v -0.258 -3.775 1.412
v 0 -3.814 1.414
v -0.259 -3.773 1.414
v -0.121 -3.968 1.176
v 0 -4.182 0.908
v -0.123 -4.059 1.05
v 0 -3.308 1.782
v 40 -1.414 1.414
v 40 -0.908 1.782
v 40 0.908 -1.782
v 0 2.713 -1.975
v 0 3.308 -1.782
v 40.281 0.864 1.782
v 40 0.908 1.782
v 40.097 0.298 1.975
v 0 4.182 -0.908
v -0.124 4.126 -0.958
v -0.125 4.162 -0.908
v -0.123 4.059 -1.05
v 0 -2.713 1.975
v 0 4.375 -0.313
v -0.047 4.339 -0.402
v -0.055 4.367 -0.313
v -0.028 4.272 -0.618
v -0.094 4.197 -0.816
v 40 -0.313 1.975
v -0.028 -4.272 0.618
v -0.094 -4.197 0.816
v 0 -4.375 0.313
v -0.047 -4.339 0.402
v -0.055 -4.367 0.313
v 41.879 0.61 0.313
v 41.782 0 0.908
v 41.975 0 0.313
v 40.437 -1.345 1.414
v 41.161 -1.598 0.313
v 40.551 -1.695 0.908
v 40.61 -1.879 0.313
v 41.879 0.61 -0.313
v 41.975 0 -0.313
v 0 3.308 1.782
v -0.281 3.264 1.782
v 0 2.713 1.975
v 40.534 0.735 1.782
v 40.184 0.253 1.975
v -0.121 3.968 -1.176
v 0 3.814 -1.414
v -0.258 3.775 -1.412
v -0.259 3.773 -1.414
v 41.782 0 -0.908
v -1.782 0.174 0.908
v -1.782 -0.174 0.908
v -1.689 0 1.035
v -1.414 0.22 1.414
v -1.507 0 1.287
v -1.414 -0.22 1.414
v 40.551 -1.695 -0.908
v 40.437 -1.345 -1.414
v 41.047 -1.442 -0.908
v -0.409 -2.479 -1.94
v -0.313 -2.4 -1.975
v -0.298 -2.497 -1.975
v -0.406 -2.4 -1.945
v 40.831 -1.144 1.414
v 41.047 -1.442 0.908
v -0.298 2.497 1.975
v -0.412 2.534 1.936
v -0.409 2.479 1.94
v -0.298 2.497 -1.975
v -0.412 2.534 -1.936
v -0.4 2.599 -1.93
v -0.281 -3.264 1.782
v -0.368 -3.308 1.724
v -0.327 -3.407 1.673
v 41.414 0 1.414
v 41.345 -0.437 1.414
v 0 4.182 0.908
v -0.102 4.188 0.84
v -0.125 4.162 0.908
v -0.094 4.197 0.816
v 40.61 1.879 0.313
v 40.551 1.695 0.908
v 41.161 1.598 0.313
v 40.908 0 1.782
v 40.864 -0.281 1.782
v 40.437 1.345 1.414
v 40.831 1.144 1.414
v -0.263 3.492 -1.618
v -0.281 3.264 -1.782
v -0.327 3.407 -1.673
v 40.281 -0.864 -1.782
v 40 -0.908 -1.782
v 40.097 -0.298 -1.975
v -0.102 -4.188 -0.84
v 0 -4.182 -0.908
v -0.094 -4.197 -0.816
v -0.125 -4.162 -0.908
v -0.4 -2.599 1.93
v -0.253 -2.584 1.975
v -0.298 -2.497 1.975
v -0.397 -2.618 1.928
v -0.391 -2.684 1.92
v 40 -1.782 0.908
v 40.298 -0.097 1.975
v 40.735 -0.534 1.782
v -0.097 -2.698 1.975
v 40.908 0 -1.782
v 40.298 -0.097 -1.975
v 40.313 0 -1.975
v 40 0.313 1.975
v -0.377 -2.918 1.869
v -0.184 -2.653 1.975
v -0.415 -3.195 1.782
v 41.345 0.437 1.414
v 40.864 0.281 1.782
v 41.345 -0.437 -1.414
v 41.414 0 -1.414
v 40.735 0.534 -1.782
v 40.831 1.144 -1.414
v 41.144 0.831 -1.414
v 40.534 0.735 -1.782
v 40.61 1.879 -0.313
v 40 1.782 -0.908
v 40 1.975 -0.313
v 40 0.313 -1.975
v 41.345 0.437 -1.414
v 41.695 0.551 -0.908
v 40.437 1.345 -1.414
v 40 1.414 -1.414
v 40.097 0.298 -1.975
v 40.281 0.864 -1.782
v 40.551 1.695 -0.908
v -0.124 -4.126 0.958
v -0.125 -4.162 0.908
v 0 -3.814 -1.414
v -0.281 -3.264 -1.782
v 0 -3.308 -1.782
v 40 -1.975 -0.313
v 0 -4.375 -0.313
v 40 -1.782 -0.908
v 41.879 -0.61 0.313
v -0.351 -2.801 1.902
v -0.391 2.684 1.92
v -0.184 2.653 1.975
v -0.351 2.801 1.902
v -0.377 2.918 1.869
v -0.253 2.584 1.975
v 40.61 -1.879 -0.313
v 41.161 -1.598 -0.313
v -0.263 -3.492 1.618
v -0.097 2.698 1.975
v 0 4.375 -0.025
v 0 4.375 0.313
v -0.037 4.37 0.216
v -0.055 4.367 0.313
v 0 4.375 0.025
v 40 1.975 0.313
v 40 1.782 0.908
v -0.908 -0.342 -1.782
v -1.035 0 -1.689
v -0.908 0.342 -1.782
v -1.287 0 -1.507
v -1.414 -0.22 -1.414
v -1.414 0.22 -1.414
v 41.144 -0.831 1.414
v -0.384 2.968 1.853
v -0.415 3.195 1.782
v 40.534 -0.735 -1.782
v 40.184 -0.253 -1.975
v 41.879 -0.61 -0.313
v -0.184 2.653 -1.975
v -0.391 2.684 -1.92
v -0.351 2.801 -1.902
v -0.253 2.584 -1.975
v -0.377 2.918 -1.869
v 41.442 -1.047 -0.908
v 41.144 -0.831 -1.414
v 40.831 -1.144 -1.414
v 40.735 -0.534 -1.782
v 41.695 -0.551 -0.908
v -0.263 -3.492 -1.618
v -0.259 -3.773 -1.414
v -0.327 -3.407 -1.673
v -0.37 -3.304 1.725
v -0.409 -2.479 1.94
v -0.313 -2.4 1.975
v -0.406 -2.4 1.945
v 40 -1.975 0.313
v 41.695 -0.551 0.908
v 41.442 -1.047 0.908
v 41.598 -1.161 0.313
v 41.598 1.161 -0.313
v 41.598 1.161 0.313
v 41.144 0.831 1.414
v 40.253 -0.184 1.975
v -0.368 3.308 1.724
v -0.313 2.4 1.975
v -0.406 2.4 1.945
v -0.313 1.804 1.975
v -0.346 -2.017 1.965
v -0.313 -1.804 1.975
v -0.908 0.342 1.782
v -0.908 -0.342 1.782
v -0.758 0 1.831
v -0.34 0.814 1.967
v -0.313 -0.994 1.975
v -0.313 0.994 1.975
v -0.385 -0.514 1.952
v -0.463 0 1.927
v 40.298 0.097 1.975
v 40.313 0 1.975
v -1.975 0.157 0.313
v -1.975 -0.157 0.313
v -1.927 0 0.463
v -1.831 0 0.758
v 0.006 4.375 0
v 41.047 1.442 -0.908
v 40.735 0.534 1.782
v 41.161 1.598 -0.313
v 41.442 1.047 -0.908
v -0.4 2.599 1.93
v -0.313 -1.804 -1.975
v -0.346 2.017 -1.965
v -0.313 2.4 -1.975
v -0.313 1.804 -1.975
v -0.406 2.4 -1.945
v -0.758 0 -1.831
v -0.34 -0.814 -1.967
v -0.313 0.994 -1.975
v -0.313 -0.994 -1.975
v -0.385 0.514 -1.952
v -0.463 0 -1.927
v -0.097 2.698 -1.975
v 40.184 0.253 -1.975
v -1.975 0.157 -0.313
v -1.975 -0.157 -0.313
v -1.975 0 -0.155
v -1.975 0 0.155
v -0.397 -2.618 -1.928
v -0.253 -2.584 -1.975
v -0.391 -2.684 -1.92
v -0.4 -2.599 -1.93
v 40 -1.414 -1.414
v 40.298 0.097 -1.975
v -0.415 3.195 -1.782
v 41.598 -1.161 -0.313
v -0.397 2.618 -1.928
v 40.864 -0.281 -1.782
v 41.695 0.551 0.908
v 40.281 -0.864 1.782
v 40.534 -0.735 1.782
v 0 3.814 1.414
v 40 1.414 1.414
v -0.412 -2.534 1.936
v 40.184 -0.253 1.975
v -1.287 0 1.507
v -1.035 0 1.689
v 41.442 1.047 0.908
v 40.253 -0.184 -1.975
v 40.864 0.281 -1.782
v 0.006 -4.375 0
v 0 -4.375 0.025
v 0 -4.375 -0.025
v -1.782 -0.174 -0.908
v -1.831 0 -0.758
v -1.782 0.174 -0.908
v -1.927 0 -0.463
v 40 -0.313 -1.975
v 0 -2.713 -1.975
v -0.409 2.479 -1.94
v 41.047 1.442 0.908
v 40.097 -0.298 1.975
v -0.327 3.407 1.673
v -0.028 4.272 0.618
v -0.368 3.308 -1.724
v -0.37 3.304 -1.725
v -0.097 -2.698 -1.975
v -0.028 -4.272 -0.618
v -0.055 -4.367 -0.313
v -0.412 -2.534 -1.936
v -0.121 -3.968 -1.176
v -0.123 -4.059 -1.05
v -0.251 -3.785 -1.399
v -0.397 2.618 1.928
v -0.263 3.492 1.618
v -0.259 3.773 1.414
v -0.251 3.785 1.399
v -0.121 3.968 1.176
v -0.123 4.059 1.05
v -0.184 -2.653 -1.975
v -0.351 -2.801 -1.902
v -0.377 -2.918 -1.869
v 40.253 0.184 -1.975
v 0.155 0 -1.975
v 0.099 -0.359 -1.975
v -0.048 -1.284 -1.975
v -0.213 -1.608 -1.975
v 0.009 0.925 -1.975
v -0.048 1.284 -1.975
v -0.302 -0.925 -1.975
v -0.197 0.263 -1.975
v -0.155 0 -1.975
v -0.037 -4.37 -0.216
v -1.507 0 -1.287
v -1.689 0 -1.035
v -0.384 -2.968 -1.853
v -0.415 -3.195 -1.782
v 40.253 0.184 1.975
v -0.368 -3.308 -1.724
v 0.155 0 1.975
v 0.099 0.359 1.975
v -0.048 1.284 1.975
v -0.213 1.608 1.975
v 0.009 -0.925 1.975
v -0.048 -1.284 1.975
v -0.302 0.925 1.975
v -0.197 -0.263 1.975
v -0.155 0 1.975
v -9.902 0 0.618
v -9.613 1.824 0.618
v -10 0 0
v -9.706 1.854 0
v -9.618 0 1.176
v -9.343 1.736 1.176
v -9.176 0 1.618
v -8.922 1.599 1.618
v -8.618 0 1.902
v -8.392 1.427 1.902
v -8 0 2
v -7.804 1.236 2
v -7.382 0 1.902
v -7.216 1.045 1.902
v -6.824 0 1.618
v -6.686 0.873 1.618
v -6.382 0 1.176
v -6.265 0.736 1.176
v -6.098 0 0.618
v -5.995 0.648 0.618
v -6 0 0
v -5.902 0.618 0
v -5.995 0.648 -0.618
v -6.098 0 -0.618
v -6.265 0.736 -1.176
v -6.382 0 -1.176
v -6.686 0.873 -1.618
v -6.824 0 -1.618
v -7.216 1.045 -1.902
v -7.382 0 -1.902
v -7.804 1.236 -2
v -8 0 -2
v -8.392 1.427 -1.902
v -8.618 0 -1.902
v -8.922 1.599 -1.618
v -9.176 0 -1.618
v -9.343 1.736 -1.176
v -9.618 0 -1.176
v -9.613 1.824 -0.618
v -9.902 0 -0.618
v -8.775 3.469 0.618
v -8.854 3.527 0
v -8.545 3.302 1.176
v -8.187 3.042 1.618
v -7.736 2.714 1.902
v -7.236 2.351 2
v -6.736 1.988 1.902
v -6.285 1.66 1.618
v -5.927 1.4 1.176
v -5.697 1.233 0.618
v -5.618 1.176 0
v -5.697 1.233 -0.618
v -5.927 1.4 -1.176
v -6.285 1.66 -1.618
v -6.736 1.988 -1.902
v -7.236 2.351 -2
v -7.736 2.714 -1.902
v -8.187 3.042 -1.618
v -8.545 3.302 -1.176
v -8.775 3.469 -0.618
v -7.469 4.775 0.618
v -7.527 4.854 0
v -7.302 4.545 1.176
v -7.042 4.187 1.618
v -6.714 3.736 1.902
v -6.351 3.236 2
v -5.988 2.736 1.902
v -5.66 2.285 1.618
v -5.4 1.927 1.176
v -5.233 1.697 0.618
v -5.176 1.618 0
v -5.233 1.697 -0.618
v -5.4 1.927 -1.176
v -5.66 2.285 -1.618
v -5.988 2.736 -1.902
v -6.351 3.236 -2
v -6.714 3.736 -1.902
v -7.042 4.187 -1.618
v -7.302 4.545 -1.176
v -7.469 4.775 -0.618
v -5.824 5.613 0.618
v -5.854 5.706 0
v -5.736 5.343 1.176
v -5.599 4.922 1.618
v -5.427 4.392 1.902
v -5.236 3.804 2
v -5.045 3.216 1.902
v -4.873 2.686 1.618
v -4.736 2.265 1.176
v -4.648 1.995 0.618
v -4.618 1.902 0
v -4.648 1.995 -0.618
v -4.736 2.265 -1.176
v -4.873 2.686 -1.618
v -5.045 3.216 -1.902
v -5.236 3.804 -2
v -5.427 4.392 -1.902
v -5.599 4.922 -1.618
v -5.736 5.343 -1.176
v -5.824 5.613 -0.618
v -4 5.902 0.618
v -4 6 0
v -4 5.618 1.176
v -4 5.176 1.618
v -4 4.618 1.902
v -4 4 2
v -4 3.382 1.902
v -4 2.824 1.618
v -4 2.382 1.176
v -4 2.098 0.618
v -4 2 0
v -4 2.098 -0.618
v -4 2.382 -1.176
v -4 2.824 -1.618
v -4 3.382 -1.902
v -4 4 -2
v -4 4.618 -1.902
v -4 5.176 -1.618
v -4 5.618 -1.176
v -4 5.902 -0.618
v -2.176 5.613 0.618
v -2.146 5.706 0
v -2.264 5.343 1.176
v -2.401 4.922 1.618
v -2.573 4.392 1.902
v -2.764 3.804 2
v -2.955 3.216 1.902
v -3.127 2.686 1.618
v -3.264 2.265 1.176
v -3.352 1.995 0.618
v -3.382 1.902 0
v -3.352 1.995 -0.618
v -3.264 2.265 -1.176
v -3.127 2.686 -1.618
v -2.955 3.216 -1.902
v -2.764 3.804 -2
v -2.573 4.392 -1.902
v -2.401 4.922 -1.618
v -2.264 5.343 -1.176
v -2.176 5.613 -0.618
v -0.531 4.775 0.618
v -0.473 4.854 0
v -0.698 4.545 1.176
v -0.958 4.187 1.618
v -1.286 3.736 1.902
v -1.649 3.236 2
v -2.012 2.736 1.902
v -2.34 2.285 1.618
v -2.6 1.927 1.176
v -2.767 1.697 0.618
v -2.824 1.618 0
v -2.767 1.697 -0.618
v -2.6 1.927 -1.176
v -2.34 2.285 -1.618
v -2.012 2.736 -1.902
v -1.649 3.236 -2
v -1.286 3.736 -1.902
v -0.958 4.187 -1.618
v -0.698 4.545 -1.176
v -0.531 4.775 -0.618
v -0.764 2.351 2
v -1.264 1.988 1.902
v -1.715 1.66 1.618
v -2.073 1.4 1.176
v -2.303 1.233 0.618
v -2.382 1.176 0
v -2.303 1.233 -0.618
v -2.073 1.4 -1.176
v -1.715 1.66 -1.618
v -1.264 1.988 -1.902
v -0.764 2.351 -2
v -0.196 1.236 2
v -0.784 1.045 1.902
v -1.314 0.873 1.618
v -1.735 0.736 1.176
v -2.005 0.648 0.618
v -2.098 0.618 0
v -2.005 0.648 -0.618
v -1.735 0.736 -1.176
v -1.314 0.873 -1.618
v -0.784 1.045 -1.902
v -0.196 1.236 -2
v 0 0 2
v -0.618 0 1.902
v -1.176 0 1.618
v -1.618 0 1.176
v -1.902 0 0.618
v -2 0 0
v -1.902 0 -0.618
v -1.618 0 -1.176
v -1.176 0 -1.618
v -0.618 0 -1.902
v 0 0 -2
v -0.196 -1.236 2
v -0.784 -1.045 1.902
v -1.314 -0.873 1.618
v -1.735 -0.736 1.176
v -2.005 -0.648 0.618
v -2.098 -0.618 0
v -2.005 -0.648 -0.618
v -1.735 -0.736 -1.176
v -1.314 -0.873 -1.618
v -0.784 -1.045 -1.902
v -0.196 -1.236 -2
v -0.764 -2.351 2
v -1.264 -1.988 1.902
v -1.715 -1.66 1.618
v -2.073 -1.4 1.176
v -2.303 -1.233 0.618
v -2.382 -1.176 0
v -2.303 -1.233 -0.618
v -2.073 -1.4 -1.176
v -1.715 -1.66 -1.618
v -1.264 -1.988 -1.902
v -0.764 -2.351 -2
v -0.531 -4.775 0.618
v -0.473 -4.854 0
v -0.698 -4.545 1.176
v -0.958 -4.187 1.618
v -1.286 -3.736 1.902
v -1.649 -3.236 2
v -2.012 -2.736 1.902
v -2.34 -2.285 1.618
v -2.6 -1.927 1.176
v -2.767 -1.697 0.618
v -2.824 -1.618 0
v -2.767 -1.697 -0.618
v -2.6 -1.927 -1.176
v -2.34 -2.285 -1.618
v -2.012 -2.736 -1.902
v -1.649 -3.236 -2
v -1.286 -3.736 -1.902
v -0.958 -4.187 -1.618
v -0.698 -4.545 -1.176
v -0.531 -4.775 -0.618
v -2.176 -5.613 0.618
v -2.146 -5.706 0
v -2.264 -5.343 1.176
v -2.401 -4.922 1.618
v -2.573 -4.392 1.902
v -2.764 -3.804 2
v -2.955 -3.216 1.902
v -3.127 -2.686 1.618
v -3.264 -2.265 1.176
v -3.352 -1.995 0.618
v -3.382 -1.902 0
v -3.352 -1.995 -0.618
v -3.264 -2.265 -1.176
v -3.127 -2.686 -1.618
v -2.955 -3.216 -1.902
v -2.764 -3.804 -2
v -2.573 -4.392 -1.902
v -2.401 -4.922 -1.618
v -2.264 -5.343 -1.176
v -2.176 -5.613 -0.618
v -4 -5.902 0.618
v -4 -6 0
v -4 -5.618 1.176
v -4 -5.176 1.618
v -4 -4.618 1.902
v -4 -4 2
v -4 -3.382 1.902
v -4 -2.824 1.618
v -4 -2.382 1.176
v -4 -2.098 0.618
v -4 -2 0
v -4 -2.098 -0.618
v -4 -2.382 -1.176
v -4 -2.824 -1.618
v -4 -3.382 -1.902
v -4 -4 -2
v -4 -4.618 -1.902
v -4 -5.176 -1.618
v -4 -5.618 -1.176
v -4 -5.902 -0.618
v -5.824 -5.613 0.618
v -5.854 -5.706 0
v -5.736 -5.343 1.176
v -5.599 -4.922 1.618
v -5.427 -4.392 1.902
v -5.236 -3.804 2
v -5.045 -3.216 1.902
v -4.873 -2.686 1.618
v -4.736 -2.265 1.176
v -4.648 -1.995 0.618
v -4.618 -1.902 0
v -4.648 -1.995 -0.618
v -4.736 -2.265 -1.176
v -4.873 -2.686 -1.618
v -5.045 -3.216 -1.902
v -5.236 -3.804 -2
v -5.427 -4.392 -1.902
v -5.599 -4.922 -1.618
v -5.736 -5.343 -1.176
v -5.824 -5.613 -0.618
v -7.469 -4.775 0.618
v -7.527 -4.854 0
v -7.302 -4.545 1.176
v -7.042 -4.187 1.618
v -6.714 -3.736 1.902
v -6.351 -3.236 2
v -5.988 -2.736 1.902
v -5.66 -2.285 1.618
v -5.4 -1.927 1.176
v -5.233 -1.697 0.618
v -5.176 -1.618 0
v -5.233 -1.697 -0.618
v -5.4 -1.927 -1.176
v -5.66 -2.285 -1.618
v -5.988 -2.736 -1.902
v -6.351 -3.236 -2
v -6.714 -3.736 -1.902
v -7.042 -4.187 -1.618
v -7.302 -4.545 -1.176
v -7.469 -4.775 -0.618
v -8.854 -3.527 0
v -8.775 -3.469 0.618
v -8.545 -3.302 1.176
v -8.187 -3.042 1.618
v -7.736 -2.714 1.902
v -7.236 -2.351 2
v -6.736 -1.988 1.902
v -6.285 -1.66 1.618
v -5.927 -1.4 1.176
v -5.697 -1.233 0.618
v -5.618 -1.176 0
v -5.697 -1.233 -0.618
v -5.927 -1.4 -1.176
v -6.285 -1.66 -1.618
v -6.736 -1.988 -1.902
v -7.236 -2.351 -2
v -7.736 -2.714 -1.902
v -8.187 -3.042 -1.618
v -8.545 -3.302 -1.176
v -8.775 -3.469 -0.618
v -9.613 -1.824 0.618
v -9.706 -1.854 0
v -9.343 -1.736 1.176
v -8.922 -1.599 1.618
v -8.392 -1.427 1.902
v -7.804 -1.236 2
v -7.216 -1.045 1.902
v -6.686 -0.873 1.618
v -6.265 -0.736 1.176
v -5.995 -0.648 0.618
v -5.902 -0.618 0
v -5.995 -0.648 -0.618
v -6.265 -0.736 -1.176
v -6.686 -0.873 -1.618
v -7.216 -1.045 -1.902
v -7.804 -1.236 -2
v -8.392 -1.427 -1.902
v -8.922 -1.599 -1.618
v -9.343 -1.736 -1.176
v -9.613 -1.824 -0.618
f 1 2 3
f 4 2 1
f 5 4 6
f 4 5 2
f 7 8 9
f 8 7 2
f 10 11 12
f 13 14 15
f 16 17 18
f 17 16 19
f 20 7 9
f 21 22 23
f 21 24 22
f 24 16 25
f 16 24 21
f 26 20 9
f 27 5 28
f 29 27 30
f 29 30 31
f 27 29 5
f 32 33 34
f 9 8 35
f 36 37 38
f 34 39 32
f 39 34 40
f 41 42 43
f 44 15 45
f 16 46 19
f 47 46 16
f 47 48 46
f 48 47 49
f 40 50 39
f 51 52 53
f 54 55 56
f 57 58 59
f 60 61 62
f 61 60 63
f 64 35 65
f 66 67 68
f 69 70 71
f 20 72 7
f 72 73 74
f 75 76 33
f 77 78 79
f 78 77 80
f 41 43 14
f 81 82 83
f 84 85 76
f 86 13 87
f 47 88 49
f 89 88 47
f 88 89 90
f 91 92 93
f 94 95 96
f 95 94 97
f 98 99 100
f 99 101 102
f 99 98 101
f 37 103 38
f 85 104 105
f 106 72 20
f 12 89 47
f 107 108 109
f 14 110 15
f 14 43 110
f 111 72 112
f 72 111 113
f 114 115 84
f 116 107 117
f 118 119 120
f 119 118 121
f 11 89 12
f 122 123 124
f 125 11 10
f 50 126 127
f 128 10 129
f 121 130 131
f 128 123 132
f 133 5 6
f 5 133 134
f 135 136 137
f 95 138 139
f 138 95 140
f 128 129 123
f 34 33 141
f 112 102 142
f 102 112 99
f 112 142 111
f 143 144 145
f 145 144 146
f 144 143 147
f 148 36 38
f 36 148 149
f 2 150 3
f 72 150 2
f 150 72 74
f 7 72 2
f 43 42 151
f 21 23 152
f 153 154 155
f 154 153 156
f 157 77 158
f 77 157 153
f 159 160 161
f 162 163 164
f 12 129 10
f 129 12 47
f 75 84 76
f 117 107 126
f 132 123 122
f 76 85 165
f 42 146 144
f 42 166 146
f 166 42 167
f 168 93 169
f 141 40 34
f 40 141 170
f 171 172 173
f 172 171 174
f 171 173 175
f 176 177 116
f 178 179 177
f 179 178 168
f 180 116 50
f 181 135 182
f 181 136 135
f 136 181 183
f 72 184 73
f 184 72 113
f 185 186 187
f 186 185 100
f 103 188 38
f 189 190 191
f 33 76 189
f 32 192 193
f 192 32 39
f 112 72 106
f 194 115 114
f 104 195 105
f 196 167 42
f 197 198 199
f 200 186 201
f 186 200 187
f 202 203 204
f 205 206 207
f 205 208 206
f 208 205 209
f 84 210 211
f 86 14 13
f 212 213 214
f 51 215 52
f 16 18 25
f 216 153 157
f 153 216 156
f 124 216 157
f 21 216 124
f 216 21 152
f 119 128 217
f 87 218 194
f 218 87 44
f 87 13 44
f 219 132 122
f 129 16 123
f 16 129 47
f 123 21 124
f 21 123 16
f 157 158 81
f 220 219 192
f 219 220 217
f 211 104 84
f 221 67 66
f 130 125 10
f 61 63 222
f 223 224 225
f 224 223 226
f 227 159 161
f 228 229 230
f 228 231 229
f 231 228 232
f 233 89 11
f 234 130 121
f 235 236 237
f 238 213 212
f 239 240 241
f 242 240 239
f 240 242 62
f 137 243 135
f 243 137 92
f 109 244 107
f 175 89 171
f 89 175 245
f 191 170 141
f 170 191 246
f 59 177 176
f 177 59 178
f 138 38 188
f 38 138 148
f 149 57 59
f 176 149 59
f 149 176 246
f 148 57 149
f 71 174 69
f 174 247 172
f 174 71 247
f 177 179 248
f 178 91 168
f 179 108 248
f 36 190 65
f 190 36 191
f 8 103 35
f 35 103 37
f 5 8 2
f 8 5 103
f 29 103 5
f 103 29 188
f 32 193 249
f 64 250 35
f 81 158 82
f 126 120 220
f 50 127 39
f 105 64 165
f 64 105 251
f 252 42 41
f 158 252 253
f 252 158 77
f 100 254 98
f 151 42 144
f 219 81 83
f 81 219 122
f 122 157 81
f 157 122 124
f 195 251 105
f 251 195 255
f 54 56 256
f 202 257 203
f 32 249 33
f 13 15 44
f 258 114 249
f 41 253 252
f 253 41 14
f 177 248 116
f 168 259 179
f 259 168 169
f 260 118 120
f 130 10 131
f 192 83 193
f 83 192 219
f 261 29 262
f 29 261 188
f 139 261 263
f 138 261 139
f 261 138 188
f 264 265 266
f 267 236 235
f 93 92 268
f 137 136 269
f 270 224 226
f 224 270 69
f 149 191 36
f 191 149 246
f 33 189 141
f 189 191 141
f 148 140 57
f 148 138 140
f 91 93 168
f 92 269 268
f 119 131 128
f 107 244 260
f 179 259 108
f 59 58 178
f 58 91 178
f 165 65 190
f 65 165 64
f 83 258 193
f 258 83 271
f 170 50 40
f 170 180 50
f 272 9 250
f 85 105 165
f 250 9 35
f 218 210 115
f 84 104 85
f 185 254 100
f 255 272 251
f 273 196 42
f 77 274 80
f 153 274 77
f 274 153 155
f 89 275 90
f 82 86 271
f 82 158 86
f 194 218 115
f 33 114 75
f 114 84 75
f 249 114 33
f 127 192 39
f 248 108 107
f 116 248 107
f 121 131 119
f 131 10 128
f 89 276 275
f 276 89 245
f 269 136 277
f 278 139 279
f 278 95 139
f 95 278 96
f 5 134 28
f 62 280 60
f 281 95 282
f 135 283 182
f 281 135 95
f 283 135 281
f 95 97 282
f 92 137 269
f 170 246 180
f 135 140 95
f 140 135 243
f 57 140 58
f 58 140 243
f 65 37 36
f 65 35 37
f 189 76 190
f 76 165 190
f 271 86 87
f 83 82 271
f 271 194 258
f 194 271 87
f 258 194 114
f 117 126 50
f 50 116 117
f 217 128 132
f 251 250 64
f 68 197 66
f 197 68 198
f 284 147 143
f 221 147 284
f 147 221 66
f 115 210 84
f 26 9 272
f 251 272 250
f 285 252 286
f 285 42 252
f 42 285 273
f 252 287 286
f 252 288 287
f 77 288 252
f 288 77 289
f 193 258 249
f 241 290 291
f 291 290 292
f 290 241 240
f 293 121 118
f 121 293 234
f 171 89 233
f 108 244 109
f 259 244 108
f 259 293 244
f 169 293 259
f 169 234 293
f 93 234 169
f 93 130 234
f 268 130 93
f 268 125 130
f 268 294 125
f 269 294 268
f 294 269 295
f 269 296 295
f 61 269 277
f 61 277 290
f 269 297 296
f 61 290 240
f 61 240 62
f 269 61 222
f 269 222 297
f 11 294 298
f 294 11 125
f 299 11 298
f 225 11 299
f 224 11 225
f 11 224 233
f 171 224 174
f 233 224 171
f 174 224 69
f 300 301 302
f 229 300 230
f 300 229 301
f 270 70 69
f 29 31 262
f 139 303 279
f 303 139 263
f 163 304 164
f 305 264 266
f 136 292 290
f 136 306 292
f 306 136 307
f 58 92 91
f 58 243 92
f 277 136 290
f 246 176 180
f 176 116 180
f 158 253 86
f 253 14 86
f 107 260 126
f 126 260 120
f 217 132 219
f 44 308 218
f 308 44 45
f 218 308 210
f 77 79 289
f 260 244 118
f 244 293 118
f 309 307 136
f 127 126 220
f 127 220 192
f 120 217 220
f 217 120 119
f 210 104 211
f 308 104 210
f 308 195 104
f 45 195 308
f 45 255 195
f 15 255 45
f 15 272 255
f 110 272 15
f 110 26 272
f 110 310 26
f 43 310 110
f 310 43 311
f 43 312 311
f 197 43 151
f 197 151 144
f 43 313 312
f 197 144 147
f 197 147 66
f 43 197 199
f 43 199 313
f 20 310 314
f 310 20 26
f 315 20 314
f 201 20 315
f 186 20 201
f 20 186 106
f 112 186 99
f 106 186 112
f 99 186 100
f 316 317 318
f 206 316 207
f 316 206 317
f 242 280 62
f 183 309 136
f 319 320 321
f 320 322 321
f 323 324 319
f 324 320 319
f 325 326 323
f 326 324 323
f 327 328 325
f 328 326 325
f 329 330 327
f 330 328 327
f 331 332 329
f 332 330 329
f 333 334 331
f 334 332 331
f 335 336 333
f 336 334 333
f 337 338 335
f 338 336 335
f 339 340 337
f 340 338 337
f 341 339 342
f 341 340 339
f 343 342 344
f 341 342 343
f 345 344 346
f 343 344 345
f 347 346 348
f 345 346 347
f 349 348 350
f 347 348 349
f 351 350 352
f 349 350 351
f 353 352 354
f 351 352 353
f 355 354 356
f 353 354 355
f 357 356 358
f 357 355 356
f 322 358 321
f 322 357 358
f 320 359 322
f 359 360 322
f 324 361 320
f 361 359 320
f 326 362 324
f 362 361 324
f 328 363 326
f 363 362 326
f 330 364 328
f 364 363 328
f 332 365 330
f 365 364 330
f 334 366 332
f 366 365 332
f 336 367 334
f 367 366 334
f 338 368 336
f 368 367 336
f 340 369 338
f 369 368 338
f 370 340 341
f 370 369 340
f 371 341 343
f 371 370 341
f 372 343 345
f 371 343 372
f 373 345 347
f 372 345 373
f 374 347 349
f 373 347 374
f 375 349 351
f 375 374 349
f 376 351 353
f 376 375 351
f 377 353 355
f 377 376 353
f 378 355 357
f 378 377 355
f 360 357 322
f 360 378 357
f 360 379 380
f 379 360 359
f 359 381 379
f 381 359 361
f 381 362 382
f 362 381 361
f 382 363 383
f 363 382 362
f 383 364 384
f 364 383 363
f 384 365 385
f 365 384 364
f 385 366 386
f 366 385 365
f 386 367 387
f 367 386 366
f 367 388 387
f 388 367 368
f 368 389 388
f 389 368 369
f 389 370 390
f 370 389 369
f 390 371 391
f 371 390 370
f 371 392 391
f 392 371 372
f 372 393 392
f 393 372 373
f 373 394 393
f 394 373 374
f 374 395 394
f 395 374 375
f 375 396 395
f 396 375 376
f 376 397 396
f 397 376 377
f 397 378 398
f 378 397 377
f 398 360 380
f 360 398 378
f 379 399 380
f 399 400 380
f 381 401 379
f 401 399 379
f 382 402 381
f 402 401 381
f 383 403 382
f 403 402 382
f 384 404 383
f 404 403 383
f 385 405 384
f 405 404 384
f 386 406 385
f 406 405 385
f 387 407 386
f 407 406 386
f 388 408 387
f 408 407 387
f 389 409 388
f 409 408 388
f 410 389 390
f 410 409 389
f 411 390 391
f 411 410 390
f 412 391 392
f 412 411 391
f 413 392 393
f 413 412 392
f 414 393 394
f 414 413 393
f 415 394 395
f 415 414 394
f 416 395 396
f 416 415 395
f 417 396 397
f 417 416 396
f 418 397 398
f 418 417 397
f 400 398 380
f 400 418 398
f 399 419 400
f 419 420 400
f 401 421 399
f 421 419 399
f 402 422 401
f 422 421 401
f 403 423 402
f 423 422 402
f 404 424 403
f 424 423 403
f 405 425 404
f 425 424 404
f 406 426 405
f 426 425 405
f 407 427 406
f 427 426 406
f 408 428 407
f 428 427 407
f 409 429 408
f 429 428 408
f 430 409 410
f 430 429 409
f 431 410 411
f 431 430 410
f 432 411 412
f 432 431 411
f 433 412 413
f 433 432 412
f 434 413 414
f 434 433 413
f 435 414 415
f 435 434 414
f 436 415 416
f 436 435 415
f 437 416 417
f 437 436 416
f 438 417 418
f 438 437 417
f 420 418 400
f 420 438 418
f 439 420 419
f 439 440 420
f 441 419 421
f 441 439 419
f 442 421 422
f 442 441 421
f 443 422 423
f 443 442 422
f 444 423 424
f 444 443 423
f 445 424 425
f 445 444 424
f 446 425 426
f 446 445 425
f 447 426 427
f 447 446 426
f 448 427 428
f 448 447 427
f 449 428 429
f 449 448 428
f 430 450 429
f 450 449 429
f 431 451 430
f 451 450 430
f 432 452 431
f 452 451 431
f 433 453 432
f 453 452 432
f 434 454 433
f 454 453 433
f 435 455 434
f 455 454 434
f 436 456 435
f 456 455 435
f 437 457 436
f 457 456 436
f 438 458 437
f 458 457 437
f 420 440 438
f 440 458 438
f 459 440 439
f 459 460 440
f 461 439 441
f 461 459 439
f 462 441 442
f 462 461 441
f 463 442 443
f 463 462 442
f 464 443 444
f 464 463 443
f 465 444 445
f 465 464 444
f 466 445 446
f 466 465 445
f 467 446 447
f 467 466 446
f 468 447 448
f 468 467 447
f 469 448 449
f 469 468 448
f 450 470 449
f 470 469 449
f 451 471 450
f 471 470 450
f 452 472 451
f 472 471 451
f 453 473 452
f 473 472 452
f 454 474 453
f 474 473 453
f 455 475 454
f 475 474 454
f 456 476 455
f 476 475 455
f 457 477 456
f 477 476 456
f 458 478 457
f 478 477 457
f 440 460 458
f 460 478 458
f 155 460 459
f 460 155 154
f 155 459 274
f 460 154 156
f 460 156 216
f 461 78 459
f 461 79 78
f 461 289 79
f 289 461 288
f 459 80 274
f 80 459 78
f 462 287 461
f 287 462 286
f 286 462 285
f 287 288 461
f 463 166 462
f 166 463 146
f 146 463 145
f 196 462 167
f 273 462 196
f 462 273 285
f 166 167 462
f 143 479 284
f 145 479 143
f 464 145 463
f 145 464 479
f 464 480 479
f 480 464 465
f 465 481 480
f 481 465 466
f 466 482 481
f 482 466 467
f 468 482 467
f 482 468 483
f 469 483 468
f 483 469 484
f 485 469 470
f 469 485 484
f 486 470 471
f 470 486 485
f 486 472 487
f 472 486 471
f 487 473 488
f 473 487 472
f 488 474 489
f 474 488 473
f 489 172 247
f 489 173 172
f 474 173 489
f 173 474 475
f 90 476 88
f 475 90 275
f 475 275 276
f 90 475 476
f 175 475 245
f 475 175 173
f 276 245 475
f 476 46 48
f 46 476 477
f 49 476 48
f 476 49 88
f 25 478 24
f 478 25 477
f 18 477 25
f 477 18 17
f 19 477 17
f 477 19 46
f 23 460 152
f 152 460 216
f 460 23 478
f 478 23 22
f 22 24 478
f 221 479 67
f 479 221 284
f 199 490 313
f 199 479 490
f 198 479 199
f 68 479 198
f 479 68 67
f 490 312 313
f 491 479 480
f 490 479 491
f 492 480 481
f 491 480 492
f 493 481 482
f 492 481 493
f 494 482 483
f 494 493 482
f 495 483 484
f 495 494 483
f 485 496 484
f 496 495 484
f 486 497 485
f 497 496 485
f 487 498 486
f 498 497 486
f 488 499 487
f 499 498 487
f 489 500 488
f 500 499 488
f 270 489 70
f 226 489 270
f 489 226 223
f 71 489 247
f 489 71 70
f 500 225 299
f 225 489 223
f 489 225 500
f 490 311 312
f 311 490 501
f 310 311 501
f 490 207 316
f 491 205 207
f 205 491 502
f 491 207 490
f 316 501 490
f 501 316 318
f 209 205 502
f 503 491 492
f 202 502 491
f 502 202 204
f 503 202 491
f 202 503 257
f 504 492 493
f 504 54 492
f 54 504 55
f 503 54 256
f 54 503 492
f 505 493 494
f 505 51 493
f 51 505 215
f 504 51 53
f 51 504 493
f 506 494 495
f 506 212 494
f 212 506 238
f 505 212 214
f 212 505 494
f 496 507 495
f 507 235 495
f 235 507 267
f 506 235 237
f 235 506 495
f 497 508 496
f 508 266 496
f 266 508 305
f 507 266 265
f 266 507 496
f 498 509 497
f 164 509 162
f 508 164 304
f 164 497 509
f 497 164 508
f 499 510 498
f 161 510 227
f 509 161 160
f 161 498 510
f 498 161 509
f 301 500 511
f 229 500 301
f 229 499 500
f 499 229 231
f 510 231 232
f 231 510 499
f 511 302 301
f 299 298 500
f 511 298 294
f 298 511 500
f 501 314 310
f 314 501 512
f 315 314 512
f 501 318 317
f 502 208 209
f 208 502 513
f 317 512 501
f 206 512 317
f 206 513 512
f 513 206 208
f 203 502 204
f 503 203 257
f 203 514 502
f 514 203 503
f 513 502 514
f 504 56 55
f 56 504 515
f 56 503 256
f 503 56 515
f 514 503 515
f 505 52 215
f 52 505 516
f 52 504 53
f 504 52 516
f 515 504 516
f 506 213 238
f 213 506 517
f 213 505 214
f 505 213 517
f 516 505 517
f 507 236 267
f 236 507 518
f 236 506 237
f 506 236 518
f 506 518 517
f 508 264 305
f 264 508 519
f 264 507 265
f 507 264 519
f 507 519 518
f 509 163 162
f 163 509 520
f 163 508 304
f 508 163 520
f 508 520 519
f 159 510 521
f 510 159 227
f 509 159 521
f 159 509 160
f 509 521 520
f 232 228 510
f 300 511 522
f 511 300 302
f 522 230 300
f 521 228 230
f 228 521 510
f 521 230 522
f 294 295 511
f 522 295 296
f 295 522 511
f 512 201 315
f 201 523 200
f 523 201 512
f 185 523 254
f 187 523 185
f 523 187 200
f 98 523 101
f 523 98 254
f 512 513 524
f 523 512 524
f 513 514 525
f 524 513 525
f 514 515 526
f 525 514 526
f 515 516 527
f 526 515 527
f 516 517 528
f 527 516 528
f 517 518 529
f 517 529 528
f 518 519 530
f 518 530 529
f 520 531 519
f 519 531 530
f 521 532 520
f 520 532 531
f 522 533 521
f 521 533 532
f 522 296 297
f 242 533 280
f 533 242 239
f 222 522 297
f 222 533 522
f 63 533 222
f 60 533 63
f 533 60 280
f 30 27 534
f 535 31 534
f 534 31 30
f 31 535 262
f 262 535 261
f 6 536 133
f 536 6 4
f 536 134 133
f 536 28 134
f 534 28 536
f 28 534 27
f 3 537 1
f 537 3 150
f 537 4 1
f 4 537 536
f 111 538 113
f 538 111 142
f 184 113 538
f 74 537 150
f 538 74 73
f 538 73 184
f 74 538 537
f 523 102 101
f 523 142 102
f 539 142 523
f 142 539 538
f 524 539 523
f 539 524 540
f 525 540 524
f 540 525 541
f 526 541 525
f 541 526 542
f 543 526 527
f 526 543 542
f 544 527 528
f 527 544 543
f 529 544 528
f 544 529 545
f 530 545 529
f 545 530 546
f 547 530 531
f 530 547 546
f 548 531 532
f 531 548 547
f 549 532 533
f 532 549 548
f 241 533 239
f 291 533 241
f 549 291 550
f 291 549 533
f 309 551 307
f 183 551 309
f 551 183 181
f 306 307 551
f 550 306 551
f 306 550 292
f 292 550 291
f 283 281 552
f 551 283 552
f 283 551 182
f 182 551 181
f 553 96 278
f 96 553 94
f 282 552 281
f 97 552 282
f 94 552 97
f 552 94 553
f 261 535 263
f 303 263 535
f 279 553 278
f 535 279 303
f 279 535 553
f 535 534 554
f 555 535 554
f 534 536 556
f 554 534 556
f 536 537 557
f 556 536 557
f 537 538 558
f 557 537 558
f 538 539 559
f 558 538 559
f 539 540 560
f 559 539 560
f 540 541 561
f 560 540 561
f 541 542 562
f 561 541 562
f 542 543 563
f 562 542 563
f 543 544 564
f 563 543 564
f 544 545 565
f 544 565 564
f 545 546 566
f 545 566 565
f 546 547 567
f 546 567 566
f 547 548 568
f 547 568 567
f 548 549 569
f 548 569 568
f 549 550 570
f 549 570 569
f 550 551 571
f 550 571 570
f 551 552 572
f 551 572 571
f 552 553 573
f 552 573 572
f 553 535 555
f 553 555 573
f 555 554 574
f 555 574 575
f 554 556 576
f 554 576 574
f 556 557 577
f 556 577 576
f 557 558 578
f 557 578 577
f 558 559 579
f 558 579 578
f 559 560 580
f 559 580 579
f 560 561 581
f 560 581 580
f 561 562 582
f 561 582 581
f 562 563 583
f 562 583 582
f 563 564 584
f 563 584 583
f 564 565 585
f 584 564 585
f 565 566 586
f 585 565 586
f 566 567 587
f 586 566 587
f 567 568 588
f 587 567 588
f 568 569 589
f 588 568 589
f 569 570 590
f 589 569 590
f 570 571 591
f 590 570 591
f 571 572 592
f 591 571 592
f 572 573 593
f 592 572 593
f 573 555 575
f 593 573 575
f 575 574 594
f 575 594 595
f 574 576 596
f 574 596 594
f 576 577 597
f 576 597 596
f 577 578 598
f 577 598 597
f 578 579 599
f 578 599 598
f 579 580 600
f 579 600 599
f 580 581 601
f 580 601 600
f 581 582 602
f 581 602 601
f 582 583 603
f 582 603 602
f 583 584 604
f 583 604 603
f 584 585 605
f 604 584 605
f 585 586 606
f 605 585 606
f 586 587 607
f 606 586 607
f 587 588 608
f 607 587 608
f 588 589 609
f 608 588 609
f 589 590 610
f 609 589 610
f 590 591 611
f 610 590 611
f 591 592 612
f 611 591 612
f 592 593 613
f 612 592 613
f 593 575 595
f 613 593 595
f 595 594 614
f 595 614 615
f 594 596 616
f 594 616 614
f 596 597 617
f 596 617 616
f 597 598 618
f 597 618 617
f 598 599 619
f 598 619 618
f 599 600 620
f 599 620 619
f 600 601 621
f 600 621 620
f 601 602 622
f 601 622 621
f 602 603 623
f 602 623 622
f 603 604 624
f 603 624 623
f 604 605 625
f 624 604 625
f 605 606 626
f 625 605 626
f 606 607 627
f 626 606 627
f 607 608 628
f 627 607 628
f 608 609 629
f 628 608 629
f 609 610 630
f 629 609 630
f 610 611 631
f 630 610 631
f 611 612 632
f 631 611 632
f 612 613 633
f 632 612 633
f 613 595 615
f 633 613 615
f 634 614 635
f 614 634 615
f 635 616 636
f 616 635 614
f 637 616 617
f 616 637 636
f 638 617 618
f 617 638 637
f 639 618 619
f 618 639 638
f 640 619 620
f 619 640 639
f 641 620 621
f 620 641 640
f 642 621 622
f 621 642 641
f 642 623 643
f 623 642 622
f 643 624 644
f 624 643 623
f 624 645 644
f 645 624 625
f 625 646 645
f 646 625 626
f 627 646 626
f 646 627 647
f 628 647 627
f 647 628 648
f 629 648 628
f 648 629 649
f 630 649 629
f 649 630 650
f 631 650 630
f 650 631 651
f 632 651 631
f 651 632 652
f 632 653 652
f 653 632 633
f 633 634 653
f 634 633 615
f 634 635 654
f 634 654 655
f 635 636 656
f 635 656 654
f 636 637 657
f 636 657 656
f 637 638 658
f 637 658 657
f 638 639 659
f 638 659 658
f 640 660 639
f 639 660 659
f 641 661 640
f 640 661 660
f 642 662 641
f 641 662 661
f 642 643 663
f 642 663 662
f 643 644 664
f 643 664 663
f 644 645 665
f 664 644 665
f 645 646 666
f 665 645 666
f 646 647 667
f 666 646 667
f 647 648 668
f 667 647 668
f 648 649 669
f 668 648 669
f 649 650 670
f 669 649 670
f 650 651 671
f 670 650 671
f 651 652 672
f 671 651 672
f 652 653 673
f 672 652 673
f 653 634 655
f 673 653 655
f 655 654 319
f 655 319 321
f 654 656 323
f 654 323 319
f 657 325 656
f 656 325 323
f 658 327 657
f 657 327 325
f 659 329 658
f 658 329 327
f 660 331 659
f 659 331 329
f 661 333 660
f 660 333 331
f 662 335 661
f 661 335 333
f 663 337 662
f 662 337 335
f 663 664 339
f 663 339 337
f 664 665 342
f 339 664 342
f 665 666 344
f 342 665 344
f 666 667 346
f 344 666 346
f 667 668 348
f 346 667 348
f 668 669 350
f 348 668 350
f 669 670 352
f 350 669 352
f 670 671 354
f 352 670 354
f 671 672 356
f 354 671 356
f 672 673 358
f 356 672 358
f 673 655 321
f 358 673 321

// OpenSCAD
use <MCAD/regular_shapes.scad>


r = 2;
l = 40;
w = 8;

a = 0.3;

$fn=20;


hull(){
    translate([l, 0, 0])
    sphere(r);
    translate([0, w*a, 0])
    sphere(r);
    translate([0, -w*a, 0])
    sphere(r);
}


translate([-w/2, 0, 0])
torus2(w/2, r);
